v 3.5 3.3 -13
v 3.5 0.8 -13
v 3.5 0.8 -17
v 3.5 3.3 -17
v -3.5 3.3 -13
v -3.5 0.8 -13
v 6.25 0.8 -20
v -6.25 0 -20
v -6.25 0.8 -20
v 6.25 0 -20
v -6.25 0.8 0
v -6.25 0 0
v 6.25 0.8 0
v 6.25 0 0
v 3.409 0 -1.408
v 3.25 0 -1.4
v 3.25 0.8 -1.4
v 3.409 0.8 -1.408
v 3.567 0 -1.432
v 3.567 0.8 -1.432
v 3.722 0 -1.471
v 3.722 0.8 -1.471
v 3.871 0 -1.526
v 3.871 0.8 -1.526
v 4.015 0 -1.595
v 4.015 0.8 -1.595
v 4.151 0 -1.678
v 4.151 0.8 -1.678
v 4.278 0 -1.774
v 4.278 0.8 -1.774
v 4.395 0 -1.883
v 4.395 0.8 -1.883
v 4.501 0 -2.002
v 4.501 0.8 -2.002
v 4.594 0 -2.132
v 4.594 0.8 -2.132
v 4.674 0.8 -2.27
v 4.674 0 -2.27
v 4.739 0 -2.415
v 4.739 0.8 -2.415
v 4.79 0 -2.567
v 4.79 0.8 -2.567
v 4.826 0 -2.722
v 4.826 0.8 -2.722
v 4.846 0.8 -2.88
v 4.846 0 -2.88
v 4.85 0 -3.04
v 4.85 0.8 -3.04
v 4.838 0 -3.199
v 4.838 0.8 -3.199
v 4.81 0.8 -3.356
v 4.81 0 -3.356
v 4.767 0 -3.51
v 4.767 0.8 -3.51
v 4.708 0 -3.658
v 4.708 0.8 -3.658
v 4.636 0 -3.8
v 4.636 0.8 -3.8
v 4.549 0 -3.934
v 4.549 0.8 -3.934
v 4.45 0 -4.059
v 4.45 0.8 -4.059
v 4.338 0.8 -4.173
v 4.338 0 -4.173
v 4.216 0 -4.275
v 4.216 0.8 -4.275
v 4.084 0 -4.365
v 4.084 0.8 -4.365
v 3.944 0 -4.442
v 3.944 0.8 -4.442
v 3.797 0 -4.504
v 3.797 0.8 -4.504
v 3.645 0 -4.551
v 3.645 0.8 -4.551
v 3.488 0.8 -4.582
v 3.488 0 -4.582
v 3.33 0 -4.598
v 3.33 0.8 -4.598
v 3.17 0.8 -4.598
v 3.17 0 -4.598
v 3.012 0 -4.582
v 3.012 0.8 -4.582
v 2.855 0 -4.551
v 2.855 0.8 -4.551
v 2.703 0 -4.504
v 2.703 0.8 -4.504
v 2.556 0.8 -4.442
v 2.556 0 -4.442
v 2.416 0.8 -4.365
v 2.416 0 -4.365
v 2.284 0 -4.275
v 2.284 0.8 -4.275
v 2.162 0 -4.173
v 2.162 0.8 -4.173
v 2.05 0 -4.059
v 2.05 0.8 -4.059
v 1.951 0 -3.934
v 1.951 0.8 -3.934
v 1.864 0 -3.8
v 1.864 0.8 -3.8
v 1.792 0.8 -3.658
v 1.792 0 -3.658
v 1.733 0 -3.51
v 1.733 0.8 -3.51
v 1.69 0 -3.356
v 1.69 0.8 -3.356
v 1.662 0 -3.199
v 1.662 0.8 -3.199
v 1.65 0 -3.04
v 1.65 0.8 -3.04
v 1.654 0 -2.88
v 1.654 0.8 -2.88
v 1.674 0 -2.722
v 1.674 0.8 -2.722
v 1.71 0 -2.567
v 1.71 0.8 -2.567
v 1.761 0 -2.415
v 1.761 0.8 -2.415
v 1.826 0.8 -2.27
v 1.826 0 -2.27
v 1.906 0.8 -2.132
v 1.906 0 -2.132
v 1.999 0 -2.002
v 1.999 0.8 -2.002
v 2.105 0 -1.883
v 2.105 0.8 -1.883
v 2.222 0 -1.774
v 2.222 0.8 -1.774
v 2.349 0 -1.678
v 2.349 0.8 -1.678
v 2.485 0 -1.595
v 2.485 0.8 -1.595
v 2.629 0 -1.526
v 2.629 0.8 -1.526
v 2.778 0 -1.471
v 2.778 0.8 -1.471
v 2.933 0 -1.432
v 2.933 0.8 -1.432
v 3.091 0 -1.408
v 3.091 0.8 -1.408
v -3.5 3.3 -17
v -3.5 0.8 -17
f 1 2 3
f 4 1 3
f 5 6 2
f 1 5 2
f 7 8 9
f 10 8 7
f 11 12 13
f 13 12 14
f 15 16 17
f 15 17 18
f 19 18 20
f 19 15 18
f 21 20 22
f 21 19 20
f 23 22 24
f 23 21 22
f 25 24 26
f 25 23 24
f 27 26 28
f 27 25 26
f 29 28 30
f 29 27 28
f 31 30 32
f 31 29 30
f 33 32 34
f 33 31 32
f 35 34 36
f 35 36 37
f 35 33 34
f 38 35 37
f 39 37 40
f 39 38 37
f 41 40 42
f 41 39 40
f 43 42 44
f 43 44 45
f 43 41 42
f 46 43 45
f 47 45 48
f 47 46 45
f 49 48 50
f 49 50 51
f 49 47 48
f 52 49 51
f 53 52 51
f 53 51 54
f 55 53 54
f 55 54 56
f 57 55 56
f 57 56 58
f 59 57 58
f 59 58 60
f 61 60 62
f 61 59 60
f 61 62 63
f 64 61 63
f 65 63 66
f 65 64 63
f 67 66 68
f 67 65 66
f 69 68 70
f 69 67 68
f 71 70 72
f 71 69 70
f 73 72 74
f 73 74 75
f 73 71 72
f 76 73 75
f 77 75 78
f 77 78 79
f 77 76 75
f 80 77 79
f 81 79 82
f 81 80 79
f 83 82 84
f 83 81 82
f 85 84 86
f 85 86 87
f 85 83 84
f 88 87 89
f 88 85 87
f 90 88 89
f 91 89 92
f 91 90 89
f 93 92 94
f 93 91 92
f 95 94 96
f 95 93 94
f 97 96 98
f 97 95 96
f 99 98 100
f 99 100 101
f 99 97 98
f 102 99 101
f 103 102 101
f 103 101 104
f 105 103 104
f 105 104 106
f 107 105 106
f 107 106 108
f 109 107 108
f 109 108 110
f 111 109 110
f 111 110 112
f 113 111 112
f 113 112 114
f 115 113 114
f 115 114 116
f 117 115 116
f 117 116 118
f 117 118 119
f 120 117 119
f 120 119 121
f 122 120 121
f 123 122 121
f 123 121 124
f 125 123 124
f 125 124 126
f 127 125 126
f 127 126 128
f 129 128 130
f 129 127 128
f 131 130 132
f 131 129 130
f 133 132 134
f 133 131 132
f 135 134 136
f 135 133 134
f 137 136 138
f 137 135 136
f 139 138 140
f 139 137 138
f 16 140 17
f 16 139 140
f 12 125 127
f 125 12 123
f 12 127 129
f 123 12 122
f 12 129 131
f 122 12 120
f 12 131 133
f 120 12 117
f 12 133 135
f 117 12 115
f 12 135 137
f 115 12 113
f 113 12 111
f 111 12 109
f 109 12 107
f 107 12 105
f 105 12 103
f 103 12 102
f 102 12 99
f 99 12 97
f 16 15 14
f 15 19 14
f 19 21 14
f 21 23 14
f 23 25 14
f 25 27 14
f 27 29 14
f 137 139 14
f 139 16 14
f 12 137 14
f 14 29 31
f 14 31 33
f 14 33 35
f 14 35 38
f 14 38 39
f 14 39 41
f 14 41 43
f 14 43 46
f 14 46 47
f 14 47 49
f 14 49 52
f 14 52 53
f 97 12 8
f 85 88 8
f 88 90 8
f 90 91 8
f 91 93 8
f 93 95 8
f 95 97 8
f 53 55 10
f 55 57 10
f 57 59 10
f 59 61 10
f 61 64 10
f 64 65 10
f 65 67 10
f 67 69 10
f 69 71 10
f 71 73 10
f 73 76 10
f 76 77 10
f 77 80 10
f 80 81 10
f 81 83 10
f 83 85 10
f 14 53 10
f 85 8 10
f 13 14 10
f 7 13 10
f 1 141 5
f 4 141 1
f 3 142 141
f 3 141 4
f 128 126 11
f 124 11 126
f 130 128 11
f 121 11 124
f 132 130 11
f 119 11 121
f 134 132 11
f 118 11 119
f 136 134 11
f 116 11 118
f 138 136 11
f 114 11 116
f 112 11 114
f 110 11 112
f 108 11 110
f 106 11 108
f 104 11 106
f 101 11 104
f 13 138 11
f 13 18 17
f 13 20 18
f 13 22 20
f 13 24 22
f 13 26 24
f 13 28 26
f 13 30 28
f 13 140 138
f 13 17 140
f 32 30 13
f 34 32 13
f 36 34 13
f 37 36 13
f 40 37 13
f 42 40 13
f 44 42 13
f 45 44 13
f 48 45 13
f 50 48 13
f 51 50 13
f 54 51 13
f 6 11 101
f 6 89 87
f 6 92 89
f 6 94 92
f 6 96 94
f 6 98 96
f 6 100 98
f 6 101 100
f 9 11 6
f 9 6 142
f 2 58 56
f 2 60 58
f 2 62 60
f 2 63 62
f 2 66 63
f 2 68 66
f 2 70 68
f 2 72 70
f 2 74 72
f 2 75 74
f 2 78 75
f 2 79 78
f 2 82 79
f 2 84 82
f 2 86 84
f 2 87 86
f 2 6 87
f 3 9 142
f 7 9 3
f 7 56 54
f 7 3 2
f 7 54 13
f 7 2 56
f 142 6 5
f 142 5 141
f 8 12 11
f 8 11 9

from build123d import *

# Parameters (mm, degrees)
SKETCH1_W           = 12.5
SKETCH1_H           = 20
SKETCH1_R           = 1.6
BOSS_EXTRUDE1_DEPTH = 0.8
SKETCH2_W           = 7
SKETCH2_H           = 4
BOSS_EXTRUDE2_DEPTH = 2.5


with BuildPart() as part:
    # Sketch1 → Boss-Extrude1 (new body)
    with BuildSketch(Plane(origin=(0, 0, 0), x_dir=(1, 0, 0), z_dir=(0, 1, 0))):
        with Locations((0, 10)):
            Rectangle(SKETCH1_W, SKETCH1_H)
        with Locations(Location((3.25, 3, 0), (0, 0, 270))):
            Circle(SKETCH1_R, mode=Mode.SUBTRACT)
    extrude(amount=BOSS_EXTRUDE1_DEPTH)

    # Sketch2 → Boss-Extrude2 (add)
    with BuildSketch(Plane(origin=(0, 0.8, 0), x_dir=(1, 0, 0), z_dir=(0, 1, 0))):
        with Locations((0, 15)):
            Rectangle(SKETCH2_W, SKETCH2_H)
    extrude(amount=BOSS_EXTRUDE2_DEPTH)


solid = part.part
